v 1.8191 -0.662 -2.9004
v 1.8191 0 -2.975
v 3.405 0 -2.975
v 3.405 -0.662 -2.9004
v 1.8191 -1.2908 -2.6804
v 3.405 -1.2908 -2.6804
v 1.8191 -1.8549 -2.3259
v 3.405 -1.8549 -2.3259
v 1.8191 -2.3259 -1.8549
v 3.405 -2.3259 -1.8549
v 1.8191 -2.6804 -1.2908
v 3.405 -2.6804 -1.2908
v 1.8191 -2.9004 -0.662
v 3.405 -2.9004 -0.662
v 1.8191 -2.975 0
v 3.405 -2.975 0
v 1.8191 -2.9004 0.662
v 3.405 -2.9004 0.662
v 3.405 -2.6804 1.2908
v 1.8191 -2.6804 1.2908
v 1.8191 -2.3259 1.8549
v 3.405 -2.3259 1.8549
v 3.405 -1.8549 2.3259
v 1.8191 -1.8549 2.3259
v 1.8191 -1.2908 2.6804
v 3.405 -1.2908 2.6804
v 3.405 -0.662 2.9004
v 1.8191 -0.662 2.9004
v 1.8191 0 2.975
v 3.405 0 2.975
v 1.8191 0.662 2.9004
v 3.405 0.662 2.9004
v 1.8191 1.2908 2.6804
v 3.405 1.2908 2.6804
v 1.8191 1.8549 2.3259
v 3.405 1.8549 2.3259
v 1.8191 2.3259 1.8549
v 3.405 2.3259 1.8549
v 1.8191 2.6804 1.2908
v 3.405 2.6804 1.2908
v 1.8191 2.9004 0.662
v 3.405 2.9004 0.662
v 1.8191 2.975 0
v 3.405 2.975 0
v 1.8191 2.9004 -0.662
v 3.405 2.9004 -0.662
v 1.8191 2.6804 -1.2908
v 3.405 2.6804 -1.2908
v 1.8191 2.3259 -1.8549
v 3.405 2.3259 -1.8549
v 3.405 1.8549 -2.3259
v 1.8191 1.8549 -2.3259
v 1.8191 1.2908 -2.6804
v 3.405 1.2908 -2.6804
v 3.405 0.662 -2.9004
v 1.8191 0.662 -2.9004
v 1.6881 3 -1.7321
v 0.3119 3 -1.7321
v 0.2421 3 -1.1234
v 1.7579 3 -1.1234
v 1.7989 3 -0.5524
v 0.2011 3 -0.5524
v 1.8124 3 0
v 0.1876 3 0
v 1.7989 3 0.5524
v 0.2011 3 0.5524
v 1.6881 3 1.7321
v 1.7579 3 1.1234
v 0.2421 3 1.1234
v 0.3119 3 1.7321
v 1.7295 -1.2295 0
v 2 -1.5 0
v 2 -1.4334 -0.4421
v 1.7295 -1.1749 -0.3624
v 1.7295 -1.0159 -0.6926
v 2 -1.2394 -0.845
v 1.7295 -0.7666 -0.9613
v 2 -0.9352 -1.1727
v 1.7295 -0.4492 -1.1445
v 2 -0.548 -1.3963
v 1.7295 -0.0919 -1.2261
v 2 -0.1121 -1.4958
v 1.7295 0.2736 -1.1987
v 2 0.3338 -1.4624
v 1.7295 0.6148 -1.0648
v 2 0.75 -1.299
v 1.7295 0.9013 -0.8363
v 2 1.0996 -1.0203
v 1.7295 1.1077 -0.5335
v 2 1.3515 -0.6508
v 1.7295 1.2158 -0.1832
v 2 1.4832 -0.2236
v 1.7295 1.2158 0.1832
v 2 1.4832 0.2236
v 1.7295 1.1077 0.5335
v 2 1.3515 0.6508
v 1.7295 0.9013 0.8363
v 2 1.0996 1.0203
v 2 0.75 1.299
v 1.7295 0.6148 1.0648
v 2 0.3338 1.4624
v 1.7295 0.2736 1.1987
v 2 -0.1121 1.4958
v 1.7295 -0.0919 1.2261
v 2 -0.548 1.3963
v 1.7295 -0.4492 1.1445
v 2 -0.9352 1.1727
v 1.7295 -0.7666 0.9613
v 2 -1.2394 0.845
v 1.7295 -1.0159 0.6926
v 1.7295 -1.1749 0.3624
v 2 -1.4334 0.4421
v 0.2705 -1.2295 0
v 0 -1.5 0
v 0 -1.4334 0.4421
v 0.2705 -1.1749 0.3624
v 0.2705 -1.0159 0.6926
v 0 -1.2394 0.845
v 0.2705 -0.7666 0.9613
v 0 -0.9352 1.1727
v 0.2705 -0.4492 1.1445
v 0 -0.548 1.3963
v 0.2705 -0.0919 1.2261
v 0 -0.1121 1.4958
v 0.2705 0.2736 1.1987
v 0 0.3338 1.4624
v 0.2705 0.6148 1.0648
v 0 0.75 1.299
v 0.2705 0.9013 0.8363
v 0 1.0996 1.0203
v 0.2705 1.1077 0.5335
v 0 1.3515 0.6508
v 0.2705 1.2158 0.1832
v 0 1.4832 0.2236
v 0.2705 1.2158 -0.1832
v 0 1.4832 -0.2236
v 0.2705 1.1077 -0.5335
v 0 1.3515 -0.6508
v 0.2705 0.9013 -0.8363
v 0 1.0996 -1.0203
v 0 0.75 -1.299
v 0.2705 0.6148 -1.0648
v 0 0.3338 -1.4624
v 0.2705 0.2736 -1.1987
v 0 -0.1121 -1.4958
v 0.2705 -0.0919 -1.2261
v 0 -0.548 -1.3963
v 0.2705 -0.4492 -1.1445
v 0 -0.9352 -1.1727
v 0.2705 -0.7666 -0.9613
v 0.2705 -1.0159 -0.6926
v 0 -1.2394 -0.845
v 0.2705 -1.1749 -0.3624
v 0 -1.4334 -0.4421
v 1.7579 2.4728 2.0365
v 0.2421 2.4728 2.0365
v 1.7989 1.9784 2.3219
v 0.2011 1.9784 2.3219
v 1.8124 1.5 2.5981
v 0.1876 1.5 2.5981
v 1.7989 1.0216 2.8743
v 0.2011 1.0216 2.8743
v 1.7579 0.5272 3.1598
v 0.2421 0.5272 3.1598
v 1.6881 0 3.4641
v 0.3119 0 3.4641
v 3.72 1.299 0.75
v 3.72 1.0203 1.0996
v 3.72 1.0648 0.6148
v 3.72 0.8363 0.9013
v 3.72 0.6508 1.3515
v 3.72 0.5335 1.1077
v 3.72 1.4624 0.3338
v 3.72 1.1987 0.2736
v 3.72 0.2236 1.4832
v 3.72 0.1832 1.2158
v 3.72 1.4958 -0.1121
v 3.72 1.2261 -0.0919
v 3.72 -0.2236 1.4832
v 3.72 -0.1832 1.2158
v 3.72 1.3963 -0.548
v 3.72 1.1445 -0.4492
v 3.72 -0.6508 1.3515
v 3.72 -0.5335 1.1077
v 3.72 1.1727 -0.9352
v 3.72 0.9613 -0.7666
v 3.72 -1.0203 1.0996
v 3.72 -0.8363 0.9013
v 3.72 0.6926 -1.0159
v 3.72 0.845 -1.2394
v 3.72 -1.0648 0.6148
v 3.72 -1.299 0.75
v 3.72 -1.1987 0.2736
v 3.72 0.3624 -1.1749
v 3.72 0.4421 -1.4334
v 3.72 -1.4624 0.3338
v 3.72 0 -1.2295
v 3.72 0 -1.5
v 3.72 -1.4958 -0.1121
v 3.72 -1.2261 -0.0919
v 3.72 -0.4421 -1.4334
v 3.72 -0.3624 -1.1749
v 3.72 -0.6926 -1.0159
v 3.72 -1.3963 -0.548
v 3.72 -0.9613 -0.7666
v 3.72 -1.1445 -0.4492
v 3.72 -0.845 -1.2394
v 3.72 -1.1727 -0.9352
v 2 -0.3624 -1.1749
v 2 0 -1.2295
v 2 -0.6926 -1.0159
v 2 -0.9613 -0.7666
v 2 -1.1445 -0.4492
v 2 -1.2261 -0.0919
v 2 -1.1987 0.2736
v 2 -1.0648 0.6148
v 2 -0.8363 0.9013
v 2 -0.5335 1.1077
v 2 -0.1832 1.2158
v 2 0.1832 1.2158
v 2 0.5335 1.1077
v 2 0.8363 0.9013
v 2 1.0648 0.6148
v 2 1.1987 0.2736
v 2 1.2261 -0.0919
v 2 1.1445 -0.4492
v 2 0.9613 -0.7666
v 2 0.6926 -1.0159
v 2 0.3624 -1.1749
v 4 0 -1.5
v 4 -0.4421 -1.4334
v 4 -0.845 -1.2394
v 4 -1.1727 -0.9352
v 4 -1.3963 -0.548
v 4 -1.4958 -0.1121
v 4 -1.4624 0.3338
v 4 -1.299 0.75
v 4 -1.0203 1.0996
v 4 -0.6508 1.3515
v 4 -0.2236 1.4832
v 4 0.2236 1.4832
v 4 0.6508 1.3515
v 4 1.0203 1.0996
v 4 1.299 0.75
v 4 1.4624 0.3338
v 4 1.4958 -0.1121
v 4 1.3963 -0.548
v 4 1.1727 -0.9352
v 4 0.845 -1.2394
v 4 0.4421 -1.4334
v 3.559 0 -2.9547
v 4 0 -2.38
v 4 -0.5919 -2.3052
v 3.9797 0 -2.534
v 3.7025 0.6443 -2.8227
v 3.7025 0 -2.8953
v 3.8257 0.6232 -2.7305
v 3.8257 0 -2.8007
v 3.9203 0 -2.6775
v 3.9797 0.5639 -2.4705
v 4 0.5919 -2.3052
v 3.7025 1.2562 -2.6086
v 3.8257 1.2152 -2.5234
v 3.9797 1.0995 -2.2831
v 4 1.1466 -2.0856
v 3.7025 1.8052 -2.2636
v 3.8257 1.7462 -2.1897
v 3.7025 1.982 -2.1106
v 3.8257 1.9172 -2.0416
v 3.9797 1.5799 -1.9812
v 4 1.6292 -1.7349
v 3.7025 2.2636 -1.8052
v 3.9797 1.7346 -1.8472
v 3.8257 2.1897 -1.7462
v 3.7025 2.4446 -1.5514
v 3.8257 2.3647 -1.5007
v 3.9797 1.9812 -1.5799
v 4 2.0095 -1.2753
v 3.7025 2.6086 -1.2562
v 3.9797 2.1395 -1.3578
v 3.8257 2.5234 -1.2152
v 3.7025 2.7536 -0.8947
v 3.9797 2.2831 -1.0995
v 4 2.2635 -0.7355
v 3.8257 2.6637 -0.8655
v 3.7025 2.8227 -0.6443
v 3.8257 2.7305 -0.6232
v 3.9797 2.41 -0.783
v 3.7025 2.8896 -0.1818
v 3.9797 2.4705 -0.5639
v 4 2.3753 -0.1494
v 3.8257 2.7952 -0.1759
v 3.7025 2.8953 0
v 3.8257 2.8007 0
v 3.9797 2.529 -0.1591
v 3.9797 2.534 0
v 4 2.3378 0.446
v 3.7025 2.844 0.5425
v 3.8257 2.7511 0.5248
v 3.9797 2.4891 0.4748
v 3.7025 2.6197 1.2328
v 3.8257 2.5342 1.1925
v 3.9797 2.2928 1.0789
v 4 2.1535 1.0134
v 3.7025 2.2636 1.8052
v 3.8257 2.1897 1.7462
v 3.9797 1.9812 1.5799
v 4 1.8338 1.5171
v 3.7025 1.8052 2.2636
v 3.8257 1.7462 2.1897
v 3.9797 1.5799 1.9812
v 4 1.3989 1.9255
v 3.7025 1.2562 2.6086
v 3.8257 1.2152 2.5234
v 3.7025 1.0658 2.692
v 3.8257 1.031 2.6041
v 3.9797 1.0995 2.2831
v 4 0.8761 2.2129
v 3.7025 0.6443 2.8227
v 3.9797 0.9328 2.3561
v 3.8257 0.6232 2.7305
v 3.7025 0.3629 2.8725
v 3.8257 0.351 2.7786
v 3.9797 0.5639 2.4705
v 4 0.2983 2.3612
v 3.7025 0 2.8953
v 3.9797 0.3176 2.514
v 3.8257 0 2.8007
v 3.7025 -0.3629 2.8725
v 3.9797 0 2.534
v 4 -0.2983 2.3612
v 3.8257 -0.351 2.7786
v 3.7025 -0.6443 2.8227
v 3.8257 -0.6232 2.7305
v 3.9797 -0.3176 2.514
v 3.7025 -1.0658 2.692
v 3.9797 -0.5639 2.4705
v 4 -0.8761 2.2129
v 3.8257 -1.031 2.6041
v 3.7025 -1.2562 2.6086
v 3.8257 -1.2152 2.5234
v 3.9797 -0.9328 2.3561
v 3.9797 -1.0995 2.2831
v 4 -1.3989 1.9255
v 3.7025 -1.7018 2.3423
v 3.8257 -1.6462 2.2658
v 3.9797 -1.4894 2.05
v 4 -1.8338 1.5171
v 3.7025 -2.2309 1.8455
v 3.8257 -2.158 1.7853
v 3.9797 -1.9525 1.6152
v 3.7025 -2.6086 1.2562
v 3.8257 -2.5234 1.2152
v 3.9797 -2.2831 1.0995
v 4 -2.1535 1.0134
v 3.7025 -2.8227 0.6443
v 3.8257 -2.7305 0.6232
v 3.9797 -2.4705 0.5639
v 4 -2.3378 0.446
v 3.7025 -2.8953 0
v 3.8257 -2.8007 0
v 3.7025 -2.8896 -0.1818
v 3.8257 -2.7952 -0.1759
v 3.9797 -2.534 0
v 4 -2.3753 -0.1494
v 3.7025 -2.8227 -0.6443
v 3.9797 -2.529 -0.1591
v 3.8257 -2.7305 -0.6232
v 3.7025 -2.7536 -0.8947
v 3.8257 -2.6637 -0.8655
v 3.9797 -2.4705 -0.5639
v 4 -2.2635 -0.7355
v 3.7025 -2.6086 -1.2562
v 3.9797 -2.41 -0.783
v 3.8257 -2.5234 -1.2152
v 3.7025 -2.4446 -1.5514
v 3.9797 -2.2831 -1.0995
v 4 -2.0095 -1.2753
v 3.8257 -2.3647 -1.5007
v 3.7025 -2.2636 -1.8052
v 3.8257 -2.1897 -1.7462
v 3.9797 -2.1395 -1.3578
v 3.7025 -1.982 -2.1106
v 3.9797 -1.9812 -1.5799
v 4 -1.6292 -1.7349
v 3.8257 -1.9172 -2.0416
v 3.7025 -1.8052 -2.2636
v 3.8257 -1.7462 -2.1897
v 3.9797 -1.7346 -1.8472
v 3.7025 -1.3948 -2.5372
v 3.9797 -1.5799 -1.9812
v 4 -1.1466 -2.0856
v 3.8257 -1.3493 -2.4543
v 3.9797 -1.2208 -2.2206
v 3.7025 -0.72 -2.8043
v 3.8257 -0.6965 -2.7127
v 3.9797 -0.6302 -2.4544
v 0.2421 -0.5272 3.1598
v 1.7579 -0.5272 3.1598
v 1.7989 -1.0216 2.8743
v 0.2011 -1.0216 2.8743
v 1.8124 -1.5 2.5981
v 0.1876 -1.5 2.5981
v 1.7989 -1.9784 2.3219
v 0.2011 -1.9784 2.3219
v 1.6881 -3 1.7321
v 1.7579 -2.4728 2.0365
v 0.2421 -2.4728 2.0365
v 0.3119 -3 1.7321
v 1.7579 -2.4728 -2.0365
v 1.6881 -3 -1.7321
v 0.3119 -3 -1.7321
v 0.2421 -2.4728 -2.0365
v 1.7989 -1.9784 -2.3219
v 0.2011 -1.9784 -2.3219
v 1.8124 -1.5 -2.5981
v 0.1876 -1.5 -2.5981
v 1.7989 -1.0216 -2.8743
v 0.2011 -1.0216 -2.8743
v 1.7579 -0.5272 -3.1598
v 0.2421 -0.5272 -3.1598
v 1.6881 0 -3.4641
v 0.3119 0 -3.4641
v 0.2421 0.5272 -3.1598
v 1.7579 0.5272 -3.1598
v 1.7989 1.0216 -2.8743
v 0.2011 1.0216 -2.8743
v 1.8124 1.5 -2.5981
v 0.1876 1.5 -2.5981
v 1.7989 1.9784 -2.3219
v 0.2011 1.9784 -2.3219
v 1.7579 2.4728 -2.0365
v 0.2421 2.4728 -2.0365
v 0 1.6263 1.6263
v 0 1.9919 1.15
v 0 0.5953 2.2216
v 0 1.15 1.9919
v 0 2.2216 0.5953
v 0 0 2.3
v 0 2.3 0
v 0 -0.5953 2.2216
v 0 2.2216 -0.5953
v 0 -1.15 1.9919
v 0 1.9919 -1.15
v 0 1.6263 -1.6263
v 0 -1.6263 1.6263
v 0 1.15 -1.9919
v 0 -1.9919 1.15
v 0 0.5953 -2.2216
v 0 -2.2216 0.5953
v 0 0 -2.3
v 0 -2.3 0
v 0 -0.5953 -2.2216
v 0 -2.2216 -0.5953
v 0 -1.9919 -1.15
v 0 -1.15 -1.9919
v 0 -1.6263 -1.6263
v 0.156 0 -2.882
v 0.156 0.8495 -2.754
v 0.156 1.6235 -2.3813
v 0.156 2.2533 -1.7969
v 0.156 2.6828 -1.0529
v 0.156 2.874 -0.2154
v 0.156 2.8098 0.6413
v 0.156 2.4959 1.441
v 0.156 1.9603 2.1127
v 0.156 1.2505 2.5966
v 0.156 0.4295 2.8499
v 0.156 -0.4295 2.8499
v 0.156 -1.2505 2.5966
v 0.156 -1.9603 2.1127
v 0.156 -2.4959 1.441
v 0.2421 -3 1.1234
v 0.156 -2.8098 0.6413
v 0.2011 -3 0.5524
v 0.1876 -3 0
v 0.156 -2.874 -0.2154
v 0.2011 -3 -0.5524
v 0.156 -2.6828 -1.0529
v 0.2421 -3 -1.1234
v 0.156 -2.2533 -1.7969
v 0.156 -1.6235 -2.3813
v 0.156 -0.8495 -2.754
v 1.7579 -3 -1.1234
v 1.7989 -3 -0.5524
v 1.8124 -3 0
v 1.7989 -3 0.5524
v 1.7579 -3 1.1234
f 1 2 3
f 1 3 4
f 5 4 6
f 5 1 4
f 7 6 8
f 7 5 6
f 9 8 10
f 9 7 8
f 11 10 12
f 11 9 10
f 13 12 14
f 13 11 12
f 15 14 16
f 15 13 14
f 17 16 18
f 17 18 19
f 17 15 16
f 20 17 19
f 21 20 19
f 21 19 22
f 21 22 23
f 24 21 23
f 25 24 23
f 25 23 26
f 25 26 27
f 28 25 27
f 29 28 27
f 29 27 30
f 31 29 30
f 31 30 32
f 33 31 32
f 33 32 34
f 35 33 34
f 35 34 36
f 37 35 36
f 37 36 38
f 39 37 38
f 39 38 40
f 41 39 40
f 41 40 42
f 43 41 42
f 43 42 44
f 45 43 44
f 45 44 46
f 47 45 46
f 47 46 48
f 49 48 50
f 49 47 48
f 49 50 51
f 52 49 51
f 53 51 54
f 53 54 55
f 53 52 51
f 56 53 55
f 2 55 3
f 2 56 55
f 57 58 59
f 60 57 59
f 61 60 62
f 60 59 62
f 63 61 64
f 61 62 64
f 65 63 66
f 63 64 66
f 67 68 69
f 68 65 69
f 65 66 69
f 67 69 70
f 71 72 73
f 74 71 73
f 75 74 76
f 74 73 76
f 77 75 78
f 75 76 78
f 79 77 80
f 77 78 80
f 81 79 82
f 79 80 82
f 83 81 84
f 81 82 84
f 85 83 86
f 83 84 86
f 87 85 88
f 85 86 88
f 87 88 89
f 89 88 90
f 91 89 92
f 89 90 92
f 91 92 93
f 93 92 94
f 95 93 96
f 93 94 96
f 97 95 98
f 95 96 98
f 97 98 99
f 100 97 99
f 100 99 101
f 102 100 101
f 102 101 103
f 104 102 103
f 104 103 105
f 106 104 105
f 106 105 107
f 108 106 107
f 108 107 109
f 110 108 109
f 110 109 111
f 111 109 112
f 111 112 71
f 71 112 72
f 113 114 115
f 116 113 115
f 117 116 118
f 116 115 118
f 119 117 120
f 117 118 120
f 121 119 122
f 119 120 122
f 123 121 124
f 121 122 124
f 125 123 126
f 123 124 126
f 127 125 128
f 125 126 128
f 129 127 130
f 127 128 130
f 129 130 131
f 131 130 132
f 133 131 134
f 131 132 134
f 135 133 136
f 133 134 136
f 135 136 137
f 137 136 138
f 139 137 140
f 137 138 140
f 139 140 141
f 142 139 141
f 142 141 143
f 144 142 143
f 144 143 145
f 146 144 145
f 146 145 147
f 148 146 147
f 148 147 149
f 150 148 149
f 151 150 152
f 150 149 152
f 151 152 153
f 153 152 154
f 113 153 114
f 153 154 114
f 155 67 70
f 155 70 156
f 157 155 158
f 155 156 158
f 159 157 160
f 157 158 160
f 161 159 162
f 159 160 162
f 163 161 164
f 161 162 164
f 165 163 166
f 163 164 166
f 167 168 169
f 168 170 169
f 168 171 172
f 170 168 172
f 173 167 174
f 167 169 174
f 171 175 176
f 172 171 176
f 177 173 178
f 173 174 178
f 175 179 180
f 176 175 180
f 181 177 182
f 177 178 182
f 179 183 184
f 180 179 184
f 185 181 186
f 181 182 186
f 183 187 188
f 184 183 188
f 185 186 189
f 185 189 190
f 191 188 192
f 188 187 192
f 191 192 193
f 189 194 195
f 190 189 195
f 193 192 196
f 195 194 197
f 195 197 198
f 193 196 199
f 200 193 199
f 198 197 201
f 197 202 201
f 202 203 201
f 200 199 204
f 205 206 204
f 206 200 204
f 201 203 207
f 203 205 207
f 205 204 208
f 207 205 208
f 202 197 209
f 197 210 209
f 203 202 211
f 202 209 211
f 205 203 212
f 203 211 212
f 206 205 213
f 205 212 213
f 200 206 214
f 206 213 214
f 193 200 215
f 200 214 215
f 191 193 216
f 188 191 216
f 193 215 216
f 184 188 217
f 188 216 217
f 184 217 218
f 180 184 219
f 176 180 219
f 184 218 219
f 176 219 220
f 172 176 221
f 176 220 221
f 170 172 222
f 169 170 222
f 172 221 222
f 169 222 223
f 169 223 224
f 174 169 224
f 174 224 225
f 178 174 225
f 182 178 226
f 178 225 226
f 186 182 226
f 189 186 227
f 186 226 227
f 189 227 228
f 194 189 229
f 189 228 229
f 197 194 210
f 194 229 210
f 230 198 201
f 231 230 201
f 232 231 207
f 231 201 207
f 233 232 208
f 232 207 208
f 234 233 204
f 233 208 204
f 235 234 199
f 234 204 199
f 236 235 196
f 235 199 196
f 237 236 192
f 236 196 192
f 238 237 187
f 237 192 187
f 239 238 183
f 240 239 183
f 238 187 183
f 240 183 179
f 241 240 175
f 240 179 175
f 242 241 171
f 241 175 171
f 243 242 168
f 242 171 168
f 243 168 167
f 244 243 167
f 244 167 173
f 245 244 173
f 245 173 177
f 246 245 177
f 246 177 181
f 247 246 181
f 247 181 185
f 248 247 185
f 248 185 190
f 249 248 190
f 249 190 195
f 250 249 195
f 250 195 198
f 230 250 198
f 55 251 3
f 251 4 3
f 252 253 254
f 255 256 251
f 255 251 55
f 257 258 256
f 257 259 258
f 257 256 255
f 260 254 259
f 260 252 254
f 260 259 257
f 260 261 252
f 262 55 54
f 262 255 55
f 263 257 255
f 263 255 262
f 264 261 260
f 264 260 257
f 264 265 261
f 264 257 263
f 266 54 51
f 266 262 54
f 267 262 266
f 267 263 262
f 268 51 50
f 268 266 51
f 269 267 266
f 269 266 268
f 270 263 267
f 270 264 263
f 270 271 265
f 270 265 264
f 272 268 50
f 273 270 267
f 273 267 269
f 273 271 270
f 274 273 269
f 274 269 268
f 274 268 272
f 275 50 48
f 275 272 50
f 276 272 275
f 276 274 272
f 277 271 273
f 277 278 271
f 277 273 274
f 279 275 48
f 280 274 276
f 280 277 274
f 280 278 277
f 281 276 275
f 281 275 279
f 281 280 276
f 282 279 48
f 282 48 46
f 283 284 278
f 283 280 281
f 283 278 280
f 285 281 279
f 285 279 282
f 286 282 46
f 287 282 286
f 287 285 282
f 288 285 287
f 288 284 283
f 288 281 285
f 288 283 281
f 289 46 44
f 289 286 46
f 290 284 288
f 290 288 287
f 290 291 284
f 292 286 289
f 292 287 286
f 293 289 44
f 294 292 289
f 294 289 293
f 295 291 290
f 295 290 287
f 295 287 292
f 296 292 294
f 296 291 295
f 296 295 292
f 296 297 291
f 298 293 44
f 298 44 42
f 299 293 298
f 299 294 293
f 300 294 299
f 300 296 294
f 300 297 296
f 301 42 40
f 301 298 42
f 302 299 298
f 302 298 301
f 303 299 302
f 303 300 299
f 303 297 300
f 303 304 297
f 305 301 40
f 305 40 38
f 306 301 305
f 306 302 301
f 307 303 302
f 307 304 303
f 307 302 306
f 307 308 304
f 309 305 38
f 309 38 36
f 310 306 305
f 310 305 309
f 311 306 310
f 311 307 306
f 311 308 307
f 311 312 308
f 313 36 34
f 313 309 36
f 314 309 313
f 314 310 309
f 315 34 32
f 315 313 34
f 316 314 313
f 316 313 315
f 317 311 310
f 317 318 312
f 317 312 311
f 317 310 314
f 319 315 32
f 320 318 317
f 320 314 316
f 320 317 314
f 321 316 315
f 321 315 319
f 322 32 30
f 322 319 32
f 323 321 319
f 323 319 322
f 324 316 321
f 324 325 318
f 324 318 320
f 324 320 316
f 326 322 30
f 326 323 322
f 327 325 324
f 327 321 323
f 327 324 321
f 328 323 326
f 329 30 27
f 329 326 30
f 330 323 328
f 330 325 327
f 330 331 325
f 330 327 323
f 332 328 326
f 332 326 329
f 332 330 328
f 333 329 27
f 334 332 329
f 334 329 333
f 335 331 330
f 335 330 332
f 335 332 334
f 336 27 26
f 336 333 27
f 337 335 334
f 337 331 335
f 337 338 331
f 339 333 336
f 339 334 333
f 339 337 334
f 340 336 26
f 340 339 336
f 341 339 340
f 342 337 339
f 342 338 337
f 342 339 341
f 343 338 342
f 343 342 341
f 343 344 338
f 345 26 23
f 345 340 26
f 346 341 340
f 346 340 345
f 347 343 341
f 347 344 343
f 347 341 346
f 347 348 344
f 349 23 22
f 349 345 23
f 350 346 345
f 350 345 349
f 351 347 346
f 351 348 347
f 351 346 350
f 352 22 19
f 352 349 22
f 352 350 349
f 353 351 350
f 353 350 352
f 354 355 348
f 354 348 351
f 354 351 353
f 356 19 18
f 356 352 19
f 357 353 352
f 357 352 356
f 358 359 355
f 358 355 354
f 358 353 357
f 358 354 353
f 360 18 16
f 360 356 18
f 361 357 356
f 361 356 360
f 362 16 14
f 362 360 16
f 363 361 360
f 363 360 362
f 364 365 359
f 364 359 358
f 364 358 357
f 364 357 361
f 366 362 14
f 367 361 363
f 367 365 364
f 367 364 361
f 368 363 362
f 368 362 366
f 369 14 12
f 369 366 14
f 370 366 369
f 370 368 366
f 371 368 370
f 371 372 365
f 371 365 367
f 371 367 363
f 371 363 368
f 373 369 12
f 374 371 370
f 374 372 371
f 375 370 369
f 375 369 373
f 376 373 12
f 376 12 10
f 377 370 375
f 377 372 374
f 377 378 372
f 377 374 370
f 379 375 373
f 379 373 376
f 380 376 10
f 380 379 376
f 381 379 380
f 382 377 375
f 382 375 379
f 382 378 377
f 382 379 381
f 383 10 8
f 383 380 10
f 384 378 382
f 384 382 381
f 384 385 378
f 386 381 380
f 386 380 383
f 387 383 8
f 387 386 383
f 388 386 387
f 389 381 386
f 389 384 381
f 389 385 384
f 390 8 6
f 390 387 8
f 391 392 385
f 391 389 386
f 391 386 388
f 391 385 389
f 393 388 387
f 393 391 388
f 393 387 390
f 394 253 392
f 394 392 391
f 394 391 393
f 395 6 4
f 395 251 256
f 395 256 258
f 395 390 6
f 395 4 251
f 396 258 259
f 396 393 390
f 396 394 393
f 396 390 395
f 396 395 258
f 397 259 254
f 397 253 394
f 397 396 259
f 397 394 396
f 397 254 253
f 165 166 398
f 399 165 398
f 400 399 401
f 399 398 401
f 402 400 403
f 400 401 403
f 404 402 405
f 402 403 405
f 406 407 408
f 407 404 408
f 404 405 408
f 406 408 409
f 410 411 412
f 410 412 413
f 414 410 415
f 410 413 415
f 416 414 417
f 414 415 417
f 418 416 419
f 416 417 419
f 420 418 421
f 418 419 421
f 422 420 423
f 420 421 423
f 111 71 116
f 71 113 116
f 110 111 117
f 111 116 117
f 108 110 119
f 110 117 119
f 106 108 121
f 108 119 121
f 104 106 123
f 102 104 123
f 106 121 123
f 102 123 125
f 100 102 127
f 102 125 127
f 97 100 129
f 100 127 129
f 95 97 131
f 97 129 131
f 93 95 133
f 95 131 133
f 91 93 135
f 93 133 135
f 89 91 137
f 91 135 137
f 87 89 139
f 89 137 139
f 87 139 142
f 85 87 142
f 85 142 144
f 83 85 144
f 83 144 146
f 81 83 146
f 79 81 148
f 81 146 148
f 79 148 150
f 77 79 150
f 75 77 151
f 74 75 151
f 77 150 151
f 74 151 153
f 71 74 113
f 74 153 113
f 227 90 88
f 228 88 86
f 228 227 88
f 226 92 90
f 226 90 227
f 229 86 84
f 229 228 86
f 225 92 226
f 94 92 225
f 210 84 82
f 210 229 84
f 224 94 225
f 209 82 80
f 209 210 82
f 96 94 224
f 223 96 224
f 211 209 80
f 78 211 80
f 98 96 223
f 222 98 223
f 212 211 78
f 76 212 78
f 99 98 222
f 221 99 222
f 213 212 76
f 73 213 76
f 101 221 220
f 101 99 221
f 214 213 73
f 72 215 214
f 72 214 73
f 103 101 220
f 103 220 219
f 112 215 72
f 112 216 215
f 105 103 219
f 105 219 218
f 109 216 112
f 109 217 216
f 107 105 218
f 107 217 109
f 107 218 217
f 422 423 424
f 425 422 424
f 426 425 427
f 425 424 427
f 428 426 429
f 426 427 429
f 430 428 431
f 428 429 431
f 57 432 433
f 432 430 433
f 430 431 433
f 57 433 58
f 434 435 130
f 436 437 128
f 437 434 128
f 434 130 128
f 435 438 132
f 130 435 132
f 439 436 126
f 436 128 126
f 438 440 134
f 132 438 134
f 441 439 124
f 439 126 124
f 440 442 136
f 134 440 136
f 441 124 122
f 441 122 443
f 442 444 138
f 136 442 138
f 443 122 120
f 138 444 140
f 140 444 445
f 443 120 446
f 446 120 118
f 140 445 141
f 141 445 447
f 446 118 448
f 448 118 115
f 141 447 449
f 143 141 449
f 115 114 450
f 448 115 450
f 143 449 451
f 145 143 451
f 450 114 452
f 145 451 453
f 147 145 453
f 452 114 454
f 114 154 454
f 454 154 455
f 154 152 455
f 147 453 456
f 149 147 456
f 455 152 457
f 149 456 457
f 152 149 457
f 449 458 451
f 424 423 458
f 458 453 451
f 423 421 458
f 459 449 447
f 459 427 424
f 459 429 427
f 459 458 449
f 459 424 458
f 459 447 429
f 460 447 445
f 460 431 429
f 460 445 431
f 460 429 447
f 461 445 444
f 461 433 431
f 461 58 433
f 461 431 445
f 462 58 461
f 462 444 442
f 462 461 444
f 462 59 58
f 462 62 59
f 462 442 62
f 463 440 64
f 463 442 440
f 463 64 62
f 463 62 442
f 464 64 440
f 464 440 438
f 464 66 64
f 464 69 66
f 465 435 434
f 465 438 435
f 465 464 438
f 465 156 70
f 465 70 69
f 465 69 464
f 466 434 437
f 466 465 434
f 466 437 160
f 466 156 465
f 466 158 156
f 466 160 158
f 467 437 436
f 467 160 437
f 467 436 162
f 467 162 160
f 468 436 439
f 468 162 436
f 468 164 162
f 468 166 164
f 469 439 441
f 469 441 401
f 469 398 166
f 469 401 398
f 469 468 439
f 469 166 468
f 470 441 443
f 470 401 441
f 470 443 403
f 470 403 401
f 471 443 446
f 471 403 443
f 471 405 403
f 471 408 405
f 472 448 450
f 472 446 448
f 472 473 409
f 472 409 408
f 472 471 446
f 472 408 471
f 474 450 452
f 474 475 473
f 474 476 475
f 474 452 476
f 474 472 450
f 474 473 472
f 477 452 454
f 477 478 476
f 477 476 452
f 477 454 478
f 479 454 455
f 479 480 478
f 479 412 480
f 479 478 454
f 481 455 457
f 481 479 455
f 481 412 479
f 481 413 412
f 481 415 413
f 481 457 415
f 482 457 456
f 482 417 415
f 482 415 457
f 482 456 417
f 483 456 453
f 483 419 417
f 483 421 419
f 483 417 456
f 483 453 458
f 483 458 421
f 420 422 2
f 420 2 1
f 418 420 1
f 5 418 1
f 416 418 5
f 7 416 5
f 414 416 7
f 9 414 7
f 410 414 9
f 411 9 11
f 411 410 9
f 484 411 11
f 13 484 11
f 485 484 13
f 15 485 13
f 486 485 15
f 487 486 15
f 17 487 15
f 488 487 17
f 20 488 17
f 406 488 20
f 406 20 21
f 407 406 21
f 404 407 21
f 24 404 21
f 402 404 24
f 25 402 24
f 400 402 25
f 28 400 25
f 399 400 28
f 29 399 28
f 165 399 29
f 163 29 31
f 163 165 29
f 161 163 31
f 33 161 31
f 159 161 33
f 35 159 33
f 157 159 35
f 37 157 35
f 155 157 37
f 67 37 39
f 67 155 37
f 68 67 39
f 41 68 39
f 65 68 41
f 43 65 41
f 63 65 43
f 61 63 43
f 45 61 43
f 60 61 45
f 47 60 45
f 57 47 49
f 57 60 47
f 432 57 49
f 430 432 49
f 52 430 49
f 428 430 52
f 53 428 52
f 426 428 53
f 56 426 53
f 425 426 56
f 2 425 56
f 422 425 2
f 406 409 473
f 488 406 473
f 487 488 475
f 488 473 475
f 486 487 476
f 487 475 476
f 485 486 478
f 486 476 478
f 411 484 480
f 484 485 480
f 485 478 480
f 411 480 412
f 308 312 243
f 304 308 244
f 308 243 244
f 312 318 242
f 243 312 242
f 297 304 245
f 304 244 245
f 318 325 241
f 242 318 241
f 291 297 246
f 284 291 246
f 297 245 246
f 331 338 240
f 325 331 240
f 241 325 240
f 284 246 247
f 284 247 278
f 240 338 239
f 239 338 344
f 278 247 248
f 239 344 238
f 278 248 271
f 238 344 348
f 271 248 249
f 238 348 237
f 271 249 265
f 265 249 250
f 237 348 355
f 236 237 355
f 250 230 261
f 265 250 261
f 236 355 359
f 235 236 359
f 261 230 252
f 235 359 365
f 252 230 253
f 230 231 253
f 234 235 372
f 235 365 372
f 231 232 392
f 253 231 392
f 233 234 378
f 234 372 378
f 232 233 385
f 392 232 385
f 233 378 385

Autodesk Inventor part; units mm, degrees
ref_plane "YZ Plane" through (0, 0, 0) normal (1, 0, 0) x (0, 1, 0)
ref_plane "XZ Plane" through (0, 0, 0) normal (0, 1, 0) x (-1, 0, 0)
ref_plane "XY Plane" through (0, 0, 0) normal (0, 0, 1) x (1, 0, 0)
sketch "Sketch_1" plane through (0, 0, 0) normal (1, 0, 0) x (0, -1, 0)
  line L0 (-3, -1.7321) -> (0, -3.4641)
  line L1 (0, -3.4641) -> (3, -1.7321)
  line L2 (3, -1.7321) -> (3, 1.7321)
  line L3 (3, 1.7321) -> (0, 3.4641)
  line L4 (0, 3.4641) -> (-3, 1.7321)
  line L5 (-3, 1.7321) -> (-3, -1.7321)
extrude "Extrusion1" add sketch "Sketch_1" along normal blind 2
sketch "Sketch_2" plane through (0, 0, 0) normal (0, -1, 0) x (0, 0, -1)
  line L0 (0, -50) -> (0, 50)
  line L1 (2.3, 0) -> (6, 0)
  line L2 (6, 0) -> (6, 0.9914)
  line L3 (6, 0.9914) -> (2.3, 0)
revolve "Revolution1" cut sketch "Sketch_2" angle 360 about axis through (-50, 0, 0) along (-1, 0, 0)
sketch "Sketch_3" plane through (0, 0, 0) normal (0, -1, 0) x (0, 0, -1)
  line L0 (0, -50) -> (0, 50)
  line L1 (2.3, 2) -> (6, 1.0086)
  line L2 (6, 1.0086) -> (6, 2)
  line L3 (6, 2) -> (2.3, 2)
revolve "Revolution2" cut sketch "Sketch_3" angle 360 about axis through (-50, 0, 0) along (-1, 0, 0)
sketch "Sketch_4" plane through (0, 0, 0) normal (0, -1, 0) x (0, 0, -1)
  line L0 (0, -200) -> (0, 200)
  line L1 (0, 4) -> (2.38, 4)
  arc A0 (2.975, 3.405) -> (2.38, 4) centre (2.38, 3.405) ccw
  line L2 (2.975, 3.405) -> (2.975, 1.7543)
  line L3 (2.975, 1.7543) -> (0, 1.7543)
  line L4 (0, 1.7543) -> (0, 4)
revolve "Revolution3" add sketch "Sketch_4" angle 360 about axis through (-200, 0, 0) along (-1, 0, 0)
sketch "Sketch_5" plane through (0, 0, 0) normal (0, 0, 1) x (0, -1, 0)
  line L0 (0, -200) -> (0, 200)
  line L1 (0, 2) -> (1.5, 2)
  line L2 (1.5, 2) -> (1.2295, 1.7295)
  line L3 (1.2295, 1.7295) -> (1.2295, 0.2705)
  line L4 (1.2295, 0.2705) -> (1.5, 0)
  line L5 (1.5, 0) -> (0, 0)
  line L6 (0, 0) -> (0, 2)
revolve "Revolution4" cut sketch "Sketch_5" angle 360 about axis through (-200, 0, 0) along (-1, 0, 0)
thread "Thread1" size "M3x0.5" class "6H" standard "ISO Metric profile" full length
sketch "Sketch6" plane through (4, 0, 0) normal (1, 0, 0) x (0, 0, -1)
  point P0 (0, 0)
hole "Hole1" at (4, 0, 0) direction (-1, 0, 0) diameter 2.459 depth 2 counterbore diameter 3 counterbore depth 0.28
properties part number "652203A2"
